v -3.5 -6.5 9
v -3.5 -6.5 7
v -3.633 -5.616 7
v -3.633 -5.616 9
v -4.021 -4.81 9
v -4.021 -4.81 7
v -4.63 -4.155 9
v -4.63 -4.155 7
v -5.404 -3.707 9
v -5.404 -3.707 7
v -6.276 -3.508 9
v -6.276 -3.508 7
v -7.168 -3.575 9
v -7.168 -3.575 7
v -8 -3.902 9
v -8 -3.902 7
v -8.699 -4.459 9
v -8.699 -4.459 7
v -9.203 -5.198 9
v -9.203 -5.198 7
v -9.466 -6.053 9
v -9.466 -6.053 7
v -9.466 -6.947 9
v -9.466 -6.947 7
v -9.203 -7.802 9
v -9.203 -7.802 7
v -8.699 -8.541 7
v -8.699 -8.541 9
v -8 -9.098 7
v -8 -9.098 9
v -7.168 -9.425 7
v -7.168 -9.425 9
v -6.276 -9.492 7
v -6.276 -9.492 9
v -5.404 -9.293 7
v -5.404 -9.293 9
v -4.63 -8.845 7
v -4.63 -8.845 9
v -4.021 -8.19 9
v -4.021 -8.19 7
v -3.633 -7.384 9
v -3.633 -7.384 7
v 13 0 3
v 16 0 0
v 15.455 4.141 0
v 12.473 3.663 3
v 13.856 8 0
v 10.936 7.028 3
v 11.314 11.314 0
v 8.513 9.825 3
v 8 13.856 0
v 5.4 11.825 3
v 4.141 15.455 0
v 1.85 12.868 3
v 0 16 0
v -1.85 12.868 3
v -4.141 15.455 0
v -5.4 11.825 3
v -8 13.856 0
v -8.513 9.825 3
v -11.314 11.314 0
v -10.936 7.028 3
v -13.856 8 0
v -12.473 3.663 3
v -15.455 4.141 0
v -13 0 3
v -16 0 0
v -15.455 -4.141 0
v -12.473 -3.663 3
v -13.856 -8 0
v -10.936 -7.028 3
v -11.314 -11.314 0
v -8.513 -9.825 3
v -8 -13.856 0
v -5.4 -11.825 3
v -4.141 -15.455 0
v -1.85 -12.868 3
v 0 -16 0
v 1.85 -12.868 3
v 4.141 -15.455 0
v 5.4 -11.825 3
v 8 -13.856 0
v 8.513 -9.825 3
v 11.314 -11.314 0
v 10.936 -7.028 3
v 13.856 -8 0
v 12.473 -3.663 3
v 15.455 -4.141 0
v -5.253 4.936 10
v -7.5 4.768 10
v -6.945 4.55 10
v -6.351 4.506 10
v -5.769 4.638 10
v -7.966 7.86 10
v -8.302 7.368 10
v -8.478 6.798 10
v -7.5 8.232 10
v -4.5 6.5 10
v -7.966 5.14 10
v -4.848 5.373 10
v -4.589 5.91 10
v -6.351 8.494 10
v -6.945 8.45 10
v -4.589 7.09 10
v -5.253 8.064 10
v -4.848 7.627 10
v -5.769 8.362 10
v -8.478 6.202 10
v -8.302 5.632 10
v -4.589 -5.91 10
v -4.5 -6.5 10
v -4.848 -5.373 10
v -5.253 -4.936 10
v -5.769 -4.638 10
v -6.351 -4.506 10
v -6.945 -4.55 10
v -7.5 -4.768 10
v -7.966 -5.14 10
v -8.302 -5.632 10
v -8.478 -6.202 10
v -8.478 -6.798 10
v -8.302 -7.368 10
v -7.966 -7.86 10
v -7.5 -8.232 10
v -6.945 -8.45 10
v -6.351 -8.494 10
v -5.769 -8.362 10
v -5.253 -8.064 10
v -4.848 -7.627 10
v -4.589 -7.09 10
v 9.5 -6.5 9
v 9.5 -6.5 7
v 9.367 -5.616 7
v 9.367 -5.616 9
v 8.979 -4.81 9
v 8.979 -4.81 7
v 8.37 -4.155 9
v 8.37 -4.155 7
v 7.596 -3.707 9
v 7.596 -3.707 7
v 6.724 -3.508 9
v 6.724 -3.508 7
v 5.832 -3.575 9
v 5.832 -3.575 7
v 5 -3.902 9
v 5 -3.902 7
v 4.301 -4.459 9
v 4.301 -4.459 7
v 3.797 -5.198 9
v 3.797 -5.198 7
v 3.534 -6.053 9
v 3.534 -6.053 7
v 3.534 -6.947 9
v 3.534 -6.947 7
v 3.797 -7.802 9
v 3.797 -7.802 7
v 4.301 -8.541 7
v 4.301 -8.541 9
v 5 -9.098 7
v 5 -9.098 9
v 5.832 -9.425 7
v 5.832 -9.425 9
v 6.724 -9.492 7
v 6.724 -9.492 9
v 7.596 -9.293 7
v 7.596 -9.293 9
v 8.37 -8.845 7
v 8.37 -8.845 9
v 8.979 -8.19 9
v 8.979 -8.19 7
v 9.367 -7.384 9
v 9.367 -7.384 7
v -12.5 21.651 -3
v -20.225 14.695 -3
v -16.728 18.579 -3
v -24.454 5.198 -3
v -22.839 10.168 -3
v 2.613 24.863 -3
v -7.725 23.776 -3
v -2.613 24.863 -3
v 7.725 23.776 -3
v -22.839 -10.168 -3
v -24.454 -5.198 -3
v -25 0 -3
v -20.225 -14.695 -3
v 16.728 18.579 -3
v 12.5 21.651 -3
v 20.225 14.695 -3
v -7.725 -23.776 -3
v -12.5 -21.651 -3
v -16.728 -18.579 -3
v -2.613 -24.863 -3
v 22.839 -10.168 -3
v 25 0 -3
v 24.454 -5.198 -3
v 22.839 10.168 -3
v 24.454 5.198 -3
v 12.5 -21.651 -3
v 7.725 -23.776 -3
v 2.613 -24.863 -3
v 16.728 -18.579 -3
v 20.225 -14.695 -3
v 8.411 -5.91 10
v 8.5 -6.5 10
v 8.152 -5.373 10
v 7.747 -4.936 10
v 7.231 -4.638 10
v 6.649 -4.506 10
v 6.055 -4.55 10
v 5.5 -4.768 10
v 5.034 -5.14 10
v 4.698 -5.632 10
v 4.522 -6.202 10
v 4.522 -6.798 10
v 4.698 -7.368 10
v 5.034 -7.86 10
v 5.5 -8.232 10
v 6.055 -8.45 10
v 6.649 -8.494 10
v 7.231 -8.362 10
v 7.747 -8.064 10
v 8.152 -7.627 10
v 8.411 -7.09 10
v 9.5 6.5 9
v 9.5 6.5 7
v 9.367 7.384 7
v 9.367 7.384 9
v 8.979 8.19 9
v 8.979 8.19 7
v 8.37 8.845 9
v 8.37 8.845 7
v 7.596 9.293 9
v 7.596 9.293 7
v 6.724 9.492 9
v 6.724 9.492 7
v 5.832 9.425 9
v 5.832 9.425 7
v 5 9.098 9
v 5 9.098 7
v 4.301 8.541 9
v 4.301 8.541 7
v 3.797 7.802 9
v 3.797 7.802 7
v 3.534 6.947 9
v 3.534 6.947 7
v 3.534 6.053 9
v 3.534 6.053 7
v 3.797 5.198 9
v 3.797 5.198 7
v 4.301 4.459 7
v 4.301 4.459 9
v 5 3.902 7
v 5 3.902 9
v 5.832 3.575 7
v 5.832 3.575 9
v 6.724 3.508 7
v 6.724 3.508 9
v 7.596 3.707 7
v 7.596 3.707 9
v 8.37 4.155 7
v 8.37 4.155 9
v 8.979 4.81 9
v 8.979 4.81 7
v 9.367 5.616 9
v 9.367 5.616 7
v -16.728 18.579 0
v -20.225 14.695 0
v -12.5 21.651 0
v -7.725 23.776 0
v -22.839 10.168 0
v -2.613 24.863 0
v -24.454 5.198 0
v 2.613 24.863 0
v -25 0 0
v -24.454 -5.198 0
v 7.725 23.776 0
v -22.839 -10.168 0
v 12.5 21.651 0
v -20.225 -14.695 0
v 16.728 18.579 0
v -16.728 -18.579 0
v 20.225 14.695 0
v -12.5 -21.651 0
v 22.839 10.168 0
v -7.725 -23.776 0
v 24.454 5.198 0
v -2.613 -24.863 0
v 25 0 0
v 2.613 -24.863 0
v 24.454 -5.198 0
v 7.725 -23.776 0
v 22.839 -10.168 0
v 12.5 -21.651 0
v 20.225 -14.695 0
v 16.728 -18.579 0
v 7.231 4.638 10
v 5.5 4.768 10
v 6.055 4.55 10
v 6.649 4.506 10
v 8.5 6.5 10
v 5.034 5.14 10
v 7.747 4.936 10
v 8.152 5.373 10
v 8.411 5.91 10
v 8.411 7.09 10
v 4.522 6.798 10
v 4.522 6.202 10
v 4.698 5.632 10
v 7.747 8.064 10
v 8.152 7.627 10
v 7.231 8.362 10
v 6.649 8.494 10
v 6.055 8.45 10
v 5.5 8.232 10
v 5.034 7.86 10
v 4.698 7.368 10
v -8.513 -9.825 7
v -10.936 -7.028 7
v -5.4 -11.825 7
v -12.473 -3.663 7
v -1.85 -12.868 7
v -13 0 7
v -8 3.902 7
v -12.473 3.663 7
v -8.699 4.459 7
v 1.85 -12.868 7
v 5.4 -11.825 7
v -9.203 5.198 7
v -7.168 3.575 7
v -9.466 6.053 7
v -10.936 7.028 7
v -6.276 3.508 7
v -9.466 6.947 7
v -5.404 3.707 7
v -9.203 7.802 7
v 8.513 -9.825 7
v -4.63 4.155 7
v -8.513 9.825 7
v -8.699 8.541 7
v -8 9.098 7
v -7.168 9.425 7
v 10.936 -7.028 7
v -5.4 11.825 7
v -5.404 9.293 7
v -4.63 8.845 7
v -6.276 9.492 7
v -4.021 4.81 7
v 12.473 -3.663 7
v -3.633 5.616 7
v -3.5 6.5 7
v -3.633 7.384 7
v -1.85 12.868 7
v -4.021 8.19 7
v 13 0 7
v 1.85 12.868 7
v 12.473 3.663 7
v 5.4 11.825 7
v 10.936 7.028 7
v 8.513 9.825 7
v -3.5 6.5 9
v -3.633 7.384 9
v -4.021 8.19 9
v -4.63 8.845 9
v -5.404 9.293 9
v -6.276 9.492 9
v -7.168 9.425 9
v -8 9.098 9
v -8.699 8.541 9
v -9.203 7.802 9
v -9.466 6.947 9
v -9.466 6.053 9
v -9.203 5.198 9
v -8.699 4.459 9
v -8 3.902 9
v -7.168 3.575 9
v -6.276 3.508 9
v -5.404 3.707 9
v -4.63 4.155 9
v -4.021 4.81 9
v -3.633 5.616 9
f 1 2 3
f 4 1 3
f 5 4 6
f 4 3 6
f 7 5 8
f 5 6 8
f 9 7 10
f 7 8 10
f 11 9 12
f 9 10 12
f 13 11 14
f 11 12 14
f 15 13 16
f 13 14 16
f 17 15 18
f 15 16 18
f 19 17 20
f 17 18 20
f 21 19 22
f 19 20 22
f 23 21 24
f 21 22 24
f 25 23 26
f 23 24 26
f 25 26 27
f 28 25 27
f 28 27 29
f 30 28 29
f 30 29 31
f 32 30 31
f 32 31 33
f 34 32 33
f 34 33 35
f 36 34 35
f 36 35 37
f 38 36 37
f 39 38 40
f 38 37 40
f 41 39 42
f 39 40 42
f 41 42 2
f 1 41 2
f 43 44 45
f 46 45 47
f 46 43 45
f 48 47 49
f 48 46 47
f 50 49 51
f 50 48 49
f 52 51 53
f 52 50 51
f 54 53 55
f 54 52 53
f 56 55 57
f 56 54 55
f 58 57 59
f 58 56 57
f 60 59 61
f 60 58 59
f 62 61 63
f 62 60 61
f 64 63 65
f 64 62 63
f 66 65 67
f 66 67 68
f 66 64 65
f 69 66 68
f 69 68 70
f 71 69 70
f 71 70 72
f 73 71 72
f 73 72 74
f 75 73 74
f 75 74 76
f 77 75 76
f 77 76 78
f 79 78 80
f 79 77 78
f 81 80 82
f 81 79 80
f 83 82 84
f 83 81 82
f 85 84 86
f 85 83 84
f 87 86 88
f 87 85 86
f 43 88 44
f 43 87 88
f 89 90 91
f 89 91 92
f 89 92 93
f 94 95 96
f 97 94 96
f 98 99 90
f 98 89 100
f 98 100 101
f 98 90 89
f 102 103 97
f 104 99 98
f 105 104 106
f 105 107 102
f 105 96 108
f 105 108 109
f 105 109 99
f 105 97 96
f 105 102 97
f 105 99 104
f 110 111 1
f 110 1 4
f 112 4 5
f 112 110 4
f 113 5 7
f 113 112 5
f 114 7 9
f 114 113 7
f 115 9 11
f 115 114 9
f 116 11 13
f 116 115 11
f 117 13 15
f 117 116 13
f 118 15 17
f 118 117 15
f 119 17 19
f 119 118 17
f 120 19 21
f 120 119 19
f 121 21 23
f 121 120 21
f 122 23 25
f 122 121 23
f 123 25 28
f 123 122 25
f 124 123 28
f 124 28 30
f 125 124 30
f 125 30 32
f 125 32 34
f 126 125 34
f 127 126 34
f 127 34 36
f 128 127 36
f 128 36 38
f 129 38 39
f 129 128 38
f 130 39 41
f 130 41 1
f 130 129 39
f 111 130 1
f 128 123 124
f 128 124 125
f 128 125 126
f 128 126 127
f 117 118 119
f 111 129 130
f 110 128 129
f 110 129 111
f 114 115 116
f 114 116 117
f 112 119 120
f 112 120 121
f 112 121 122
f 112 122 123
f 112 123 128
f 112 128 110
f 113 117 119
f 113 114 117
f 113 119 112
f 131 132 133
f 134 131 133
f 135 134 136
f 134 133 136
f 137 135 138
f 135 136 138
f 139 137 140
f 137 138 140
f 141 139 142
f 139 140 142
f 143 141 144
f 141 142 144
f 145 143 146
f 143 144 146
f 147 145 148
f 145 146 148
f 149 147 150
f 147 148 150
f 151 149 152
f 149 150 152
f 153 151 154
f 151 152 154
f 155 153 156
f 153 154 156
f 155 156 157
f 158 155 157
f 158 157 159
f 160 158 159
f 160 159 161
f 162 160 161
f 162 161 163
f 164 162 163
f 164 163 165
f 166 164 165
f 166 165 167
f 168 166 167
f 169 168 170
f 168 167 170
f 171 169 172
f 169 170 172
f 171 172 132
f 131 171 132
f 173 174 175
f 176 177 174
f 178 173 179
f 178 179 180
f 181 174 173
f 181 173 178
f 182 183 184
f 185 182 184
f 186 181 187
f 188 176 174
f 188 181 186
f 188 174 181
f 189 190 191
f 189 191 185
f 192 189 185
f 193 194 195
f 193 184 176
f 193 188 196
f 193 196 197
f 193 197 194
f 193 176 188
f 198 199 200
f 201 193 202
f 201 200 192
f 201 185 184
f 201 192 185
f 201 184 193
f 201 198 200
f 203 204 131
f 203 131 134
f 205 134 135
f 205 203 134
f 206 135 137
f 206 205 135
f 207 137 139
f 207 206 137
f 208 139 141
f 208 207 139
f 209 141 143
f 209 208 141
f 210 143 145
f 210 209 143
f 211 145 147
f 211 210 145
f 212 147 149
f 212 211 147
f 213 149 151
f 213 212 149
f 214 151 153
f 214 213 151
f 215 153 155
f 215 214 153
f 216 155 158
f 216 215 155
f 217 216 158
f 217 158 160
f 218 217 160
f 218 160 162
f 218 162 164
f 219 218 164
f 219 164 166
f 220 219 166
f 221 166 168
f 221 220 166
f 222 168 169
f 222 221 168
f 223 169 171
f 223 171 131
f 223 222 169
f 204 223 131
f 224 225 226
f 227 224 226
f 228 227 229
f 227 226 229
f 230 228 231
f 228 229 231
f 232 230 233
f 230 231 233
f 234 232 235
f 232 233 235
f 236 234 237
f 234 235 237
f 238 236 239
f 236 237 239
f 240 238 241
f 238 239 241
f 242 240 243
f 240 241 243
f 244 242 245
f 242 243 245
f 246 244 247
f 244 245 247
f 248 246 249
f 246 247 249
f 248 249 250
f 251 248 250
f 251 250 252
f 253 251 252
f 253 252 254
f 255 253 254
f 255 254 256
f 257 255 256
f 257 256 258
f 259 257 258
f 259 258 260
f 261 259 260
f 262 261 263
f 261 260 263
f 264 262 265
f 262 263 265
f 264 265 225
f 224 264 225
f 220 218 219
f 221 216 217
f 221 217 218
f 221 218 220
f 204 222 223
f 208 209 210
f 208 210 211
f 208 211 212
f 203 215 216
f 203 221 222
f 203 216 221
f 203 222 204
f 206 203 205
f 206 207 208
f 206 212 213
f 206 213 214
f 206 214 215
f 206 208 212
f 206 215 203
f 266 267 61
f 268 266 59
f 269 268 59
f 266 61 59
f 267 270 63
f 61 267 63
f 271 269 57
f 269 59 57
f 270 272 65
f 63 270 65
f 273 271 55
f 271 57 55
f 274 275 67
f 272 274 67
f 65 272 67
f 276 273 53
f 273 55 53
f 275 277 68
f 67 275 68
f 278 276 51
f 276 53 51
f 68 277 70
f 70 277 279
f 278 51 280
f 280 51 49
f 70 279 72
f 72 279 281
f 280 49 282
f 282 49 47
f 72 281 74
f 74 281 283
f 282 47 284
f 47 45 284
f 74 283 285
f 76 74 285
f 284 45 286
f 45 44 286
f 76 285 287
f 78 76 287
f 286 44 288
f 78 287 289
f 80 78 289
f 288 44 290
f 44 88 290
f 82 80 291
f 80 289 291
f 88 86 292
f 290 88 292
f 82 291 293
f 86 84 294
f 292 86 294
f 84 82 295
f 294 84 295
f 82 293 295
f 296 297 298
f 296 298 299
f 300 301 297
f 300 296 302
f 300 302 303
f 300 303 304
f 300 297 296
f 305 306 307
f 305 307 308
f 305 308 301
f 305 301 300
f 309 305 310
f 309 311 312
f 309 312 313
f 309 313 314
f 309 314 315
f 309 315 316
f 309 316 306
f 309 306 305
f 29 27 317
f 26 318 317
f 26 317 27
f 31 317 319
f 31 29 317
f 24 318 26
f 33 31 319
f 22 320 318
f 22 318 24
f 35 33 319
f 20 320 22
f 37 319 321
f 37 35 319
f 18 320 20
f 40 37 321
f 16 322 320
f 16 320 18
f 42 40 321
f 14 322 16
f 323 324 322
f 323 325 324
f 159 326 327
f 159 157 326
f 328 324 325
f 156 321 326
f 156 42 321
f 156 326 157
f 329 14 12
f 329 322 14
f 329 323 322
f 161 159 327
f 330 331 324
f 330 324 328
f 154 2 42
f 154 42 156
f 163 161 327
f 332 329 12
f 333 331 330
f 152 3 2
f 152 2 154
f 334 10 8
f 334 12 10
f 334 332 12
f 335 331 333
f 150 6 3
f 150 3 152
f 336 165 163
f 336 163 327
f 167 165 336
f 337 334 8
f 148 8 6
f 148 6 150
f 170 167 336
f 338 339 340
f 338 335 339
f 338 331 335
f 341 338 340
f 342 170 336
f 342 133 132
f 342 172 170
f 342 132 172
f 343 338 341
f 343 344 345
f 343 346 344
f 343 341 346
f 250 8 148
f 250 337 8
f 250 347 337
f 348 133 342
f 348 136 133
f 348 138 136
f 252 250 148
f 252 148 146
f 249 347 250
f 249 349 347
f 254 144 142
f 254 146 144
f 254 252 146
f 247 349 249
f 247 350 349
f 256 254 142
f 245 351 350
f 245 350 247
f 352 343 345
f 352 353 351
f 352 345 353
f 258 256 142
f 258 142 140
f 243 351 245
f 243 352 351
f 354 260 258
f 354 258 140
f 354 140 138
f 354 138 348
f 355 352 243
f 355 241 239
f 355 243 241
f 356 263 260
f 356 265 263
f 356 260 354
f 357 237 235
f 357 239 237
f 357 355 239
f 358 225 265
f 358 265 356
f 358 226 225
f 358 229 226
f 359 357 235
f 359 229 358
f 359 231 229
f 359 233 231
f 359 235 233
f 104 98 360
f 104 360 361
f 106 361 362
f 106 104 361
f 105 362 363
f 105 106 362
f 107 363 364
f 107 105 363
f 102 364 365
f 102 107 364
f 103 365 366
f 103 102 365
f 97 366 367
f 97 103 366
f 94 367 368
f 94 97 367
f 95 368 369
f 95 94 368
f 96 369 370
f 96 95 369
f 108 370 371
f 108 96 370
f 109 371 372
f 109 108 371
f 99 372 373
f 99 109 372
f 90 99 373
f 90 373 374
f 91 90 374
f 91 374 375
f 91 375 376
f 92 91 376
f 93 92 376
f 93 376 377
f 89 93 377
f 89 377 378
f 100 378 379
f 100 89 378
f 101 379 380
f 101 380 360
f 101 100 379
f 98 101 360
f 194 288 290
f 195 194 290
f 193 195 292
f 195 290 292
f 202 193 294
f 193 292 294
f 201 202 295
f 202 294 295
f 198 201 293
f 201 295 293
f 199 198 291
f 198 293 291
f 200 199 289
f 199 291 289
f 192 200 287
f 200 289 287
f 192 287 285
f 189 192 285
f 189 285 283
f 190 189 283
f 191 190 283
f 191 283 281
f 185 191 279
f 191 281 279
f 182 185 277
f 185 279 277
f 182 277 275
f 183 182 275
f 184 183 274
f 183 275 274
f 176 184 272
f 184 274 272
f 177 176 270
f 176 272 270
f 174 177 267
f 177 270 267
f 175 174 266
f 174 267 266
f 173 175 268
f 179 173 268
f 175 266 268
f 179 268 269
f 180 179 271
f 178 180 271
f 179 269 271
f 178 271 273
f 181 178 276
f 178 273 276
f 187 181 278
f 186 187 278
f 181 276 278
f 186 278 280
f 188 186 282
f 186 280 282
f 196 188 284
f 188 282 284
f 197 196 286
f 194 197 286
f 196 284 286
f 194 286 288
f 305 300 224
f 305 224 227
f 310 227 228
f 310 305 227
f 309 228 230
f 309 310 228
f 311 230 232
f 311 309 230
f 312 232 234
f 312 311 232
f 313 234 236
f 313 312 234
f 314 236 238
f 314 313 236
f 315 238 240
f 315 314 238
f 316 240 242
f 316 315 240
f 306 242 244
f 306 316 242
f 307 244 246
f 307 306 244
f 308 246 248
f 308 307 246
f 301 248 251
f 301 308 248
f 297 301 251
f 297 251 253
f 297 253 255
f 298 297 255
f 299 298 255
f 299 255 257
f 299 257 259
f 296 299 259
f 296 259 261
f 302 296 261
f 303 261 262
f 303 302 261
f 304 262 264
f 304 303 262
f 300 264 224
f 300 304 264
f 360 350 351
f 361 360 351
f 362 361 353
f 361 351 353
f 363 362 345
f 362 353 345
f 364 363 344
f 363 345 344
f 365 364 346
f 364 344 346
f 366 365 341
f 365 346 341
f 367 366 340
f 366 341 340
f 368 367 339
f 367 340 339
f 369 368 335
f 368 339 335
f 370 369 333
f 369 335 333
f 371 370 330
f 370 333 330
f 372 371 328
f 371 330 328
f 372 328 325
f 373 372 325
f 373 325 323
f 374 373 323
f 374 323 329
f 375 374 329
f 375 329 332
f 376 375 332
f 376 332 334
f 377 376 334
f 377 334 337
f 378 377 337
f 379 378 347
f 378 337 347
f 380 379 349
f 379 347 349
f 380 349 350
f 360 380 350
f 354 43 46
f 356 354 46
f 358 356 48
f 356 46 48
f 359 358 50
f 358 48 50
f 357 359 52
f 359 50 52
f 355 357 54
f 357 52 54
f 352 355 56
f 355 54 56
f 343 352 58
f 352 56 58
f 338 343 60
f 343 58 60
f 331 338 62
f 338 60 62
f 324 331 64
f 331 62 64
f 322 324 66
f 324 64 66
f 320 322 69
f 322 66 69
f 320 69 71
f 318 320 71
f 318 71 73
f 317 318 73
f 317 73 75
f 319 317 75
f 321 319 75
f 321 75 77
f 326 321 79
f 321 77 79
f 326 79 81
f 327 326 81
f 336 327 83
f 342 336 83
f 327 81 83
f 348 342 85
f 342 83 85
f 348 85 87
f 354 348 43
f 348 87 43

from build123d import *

# Parameters (mm, degrees)
SKETCH_R        = 13
PAD_DEPTH       = 7
SKETCH001_R     = 3
PAD001_DEPTH    = 3
CHAMFER_SIZE    = 1
SKETCH002_R     = 25
PAD002_DEPTH    = 3
CHAMFER001_SIZE = 3


with BuildPart() as part:
    # Sketch → Pad (new body)
    with BuildSketch(Plane.XY):
        Circle(SKETCH_R)
    extrude(amount=PAD_DEPTH)

    # Sketch001 (on Face3 of Pad) → Pad001 (join)
    with BuildSketch(Plane.XY.offset(7)):
        with Locations((-6.5, 6.5)):
            Circle(SKETCH001_R)
        with Locations((-6.5, -6.5)):
            Circle(SKETCH001_R)
        with Locations((6.5, -6.5)):
            Circle(SKETCH001_R)
        with Locations((6.5, 6.5)):
            Circle(SKETCH001_R)
    extrude(amount=PAD001_DEPTH)

    # Chamfer
    chamfer_edges = [part.edges().sort_by_distance(p)[0] for p in [
        (-9.5, -6.5, 10),
        (3.5, -6.5, 10),
        (-9.5, 6.5, 10),
        (3.5, 6.5, 10),
    ]]
    chamfer(chamfer_edges, length=CHAMFER_SIZE)

    # Sketch002 (on Face9 of Chamfer) → Pad002 (join)
    with BuildSketch(Plane(origin=(0, 0, 0), x_dir=(1, 0, 0), z_dir=(0, 0, -1))):
        Circle(SKETCH002_R)
    extrude(amount=PAD002_DEPTH)

    # Chamfer001
    chamfer001_edges = [part.edges().sort_by_distance(p)[0] for p in [
        (-13, 0, 0),
    ]]
    chamfer(chamfer001_edges, length=CHAMFER001_SIZE)


solid = part.part
